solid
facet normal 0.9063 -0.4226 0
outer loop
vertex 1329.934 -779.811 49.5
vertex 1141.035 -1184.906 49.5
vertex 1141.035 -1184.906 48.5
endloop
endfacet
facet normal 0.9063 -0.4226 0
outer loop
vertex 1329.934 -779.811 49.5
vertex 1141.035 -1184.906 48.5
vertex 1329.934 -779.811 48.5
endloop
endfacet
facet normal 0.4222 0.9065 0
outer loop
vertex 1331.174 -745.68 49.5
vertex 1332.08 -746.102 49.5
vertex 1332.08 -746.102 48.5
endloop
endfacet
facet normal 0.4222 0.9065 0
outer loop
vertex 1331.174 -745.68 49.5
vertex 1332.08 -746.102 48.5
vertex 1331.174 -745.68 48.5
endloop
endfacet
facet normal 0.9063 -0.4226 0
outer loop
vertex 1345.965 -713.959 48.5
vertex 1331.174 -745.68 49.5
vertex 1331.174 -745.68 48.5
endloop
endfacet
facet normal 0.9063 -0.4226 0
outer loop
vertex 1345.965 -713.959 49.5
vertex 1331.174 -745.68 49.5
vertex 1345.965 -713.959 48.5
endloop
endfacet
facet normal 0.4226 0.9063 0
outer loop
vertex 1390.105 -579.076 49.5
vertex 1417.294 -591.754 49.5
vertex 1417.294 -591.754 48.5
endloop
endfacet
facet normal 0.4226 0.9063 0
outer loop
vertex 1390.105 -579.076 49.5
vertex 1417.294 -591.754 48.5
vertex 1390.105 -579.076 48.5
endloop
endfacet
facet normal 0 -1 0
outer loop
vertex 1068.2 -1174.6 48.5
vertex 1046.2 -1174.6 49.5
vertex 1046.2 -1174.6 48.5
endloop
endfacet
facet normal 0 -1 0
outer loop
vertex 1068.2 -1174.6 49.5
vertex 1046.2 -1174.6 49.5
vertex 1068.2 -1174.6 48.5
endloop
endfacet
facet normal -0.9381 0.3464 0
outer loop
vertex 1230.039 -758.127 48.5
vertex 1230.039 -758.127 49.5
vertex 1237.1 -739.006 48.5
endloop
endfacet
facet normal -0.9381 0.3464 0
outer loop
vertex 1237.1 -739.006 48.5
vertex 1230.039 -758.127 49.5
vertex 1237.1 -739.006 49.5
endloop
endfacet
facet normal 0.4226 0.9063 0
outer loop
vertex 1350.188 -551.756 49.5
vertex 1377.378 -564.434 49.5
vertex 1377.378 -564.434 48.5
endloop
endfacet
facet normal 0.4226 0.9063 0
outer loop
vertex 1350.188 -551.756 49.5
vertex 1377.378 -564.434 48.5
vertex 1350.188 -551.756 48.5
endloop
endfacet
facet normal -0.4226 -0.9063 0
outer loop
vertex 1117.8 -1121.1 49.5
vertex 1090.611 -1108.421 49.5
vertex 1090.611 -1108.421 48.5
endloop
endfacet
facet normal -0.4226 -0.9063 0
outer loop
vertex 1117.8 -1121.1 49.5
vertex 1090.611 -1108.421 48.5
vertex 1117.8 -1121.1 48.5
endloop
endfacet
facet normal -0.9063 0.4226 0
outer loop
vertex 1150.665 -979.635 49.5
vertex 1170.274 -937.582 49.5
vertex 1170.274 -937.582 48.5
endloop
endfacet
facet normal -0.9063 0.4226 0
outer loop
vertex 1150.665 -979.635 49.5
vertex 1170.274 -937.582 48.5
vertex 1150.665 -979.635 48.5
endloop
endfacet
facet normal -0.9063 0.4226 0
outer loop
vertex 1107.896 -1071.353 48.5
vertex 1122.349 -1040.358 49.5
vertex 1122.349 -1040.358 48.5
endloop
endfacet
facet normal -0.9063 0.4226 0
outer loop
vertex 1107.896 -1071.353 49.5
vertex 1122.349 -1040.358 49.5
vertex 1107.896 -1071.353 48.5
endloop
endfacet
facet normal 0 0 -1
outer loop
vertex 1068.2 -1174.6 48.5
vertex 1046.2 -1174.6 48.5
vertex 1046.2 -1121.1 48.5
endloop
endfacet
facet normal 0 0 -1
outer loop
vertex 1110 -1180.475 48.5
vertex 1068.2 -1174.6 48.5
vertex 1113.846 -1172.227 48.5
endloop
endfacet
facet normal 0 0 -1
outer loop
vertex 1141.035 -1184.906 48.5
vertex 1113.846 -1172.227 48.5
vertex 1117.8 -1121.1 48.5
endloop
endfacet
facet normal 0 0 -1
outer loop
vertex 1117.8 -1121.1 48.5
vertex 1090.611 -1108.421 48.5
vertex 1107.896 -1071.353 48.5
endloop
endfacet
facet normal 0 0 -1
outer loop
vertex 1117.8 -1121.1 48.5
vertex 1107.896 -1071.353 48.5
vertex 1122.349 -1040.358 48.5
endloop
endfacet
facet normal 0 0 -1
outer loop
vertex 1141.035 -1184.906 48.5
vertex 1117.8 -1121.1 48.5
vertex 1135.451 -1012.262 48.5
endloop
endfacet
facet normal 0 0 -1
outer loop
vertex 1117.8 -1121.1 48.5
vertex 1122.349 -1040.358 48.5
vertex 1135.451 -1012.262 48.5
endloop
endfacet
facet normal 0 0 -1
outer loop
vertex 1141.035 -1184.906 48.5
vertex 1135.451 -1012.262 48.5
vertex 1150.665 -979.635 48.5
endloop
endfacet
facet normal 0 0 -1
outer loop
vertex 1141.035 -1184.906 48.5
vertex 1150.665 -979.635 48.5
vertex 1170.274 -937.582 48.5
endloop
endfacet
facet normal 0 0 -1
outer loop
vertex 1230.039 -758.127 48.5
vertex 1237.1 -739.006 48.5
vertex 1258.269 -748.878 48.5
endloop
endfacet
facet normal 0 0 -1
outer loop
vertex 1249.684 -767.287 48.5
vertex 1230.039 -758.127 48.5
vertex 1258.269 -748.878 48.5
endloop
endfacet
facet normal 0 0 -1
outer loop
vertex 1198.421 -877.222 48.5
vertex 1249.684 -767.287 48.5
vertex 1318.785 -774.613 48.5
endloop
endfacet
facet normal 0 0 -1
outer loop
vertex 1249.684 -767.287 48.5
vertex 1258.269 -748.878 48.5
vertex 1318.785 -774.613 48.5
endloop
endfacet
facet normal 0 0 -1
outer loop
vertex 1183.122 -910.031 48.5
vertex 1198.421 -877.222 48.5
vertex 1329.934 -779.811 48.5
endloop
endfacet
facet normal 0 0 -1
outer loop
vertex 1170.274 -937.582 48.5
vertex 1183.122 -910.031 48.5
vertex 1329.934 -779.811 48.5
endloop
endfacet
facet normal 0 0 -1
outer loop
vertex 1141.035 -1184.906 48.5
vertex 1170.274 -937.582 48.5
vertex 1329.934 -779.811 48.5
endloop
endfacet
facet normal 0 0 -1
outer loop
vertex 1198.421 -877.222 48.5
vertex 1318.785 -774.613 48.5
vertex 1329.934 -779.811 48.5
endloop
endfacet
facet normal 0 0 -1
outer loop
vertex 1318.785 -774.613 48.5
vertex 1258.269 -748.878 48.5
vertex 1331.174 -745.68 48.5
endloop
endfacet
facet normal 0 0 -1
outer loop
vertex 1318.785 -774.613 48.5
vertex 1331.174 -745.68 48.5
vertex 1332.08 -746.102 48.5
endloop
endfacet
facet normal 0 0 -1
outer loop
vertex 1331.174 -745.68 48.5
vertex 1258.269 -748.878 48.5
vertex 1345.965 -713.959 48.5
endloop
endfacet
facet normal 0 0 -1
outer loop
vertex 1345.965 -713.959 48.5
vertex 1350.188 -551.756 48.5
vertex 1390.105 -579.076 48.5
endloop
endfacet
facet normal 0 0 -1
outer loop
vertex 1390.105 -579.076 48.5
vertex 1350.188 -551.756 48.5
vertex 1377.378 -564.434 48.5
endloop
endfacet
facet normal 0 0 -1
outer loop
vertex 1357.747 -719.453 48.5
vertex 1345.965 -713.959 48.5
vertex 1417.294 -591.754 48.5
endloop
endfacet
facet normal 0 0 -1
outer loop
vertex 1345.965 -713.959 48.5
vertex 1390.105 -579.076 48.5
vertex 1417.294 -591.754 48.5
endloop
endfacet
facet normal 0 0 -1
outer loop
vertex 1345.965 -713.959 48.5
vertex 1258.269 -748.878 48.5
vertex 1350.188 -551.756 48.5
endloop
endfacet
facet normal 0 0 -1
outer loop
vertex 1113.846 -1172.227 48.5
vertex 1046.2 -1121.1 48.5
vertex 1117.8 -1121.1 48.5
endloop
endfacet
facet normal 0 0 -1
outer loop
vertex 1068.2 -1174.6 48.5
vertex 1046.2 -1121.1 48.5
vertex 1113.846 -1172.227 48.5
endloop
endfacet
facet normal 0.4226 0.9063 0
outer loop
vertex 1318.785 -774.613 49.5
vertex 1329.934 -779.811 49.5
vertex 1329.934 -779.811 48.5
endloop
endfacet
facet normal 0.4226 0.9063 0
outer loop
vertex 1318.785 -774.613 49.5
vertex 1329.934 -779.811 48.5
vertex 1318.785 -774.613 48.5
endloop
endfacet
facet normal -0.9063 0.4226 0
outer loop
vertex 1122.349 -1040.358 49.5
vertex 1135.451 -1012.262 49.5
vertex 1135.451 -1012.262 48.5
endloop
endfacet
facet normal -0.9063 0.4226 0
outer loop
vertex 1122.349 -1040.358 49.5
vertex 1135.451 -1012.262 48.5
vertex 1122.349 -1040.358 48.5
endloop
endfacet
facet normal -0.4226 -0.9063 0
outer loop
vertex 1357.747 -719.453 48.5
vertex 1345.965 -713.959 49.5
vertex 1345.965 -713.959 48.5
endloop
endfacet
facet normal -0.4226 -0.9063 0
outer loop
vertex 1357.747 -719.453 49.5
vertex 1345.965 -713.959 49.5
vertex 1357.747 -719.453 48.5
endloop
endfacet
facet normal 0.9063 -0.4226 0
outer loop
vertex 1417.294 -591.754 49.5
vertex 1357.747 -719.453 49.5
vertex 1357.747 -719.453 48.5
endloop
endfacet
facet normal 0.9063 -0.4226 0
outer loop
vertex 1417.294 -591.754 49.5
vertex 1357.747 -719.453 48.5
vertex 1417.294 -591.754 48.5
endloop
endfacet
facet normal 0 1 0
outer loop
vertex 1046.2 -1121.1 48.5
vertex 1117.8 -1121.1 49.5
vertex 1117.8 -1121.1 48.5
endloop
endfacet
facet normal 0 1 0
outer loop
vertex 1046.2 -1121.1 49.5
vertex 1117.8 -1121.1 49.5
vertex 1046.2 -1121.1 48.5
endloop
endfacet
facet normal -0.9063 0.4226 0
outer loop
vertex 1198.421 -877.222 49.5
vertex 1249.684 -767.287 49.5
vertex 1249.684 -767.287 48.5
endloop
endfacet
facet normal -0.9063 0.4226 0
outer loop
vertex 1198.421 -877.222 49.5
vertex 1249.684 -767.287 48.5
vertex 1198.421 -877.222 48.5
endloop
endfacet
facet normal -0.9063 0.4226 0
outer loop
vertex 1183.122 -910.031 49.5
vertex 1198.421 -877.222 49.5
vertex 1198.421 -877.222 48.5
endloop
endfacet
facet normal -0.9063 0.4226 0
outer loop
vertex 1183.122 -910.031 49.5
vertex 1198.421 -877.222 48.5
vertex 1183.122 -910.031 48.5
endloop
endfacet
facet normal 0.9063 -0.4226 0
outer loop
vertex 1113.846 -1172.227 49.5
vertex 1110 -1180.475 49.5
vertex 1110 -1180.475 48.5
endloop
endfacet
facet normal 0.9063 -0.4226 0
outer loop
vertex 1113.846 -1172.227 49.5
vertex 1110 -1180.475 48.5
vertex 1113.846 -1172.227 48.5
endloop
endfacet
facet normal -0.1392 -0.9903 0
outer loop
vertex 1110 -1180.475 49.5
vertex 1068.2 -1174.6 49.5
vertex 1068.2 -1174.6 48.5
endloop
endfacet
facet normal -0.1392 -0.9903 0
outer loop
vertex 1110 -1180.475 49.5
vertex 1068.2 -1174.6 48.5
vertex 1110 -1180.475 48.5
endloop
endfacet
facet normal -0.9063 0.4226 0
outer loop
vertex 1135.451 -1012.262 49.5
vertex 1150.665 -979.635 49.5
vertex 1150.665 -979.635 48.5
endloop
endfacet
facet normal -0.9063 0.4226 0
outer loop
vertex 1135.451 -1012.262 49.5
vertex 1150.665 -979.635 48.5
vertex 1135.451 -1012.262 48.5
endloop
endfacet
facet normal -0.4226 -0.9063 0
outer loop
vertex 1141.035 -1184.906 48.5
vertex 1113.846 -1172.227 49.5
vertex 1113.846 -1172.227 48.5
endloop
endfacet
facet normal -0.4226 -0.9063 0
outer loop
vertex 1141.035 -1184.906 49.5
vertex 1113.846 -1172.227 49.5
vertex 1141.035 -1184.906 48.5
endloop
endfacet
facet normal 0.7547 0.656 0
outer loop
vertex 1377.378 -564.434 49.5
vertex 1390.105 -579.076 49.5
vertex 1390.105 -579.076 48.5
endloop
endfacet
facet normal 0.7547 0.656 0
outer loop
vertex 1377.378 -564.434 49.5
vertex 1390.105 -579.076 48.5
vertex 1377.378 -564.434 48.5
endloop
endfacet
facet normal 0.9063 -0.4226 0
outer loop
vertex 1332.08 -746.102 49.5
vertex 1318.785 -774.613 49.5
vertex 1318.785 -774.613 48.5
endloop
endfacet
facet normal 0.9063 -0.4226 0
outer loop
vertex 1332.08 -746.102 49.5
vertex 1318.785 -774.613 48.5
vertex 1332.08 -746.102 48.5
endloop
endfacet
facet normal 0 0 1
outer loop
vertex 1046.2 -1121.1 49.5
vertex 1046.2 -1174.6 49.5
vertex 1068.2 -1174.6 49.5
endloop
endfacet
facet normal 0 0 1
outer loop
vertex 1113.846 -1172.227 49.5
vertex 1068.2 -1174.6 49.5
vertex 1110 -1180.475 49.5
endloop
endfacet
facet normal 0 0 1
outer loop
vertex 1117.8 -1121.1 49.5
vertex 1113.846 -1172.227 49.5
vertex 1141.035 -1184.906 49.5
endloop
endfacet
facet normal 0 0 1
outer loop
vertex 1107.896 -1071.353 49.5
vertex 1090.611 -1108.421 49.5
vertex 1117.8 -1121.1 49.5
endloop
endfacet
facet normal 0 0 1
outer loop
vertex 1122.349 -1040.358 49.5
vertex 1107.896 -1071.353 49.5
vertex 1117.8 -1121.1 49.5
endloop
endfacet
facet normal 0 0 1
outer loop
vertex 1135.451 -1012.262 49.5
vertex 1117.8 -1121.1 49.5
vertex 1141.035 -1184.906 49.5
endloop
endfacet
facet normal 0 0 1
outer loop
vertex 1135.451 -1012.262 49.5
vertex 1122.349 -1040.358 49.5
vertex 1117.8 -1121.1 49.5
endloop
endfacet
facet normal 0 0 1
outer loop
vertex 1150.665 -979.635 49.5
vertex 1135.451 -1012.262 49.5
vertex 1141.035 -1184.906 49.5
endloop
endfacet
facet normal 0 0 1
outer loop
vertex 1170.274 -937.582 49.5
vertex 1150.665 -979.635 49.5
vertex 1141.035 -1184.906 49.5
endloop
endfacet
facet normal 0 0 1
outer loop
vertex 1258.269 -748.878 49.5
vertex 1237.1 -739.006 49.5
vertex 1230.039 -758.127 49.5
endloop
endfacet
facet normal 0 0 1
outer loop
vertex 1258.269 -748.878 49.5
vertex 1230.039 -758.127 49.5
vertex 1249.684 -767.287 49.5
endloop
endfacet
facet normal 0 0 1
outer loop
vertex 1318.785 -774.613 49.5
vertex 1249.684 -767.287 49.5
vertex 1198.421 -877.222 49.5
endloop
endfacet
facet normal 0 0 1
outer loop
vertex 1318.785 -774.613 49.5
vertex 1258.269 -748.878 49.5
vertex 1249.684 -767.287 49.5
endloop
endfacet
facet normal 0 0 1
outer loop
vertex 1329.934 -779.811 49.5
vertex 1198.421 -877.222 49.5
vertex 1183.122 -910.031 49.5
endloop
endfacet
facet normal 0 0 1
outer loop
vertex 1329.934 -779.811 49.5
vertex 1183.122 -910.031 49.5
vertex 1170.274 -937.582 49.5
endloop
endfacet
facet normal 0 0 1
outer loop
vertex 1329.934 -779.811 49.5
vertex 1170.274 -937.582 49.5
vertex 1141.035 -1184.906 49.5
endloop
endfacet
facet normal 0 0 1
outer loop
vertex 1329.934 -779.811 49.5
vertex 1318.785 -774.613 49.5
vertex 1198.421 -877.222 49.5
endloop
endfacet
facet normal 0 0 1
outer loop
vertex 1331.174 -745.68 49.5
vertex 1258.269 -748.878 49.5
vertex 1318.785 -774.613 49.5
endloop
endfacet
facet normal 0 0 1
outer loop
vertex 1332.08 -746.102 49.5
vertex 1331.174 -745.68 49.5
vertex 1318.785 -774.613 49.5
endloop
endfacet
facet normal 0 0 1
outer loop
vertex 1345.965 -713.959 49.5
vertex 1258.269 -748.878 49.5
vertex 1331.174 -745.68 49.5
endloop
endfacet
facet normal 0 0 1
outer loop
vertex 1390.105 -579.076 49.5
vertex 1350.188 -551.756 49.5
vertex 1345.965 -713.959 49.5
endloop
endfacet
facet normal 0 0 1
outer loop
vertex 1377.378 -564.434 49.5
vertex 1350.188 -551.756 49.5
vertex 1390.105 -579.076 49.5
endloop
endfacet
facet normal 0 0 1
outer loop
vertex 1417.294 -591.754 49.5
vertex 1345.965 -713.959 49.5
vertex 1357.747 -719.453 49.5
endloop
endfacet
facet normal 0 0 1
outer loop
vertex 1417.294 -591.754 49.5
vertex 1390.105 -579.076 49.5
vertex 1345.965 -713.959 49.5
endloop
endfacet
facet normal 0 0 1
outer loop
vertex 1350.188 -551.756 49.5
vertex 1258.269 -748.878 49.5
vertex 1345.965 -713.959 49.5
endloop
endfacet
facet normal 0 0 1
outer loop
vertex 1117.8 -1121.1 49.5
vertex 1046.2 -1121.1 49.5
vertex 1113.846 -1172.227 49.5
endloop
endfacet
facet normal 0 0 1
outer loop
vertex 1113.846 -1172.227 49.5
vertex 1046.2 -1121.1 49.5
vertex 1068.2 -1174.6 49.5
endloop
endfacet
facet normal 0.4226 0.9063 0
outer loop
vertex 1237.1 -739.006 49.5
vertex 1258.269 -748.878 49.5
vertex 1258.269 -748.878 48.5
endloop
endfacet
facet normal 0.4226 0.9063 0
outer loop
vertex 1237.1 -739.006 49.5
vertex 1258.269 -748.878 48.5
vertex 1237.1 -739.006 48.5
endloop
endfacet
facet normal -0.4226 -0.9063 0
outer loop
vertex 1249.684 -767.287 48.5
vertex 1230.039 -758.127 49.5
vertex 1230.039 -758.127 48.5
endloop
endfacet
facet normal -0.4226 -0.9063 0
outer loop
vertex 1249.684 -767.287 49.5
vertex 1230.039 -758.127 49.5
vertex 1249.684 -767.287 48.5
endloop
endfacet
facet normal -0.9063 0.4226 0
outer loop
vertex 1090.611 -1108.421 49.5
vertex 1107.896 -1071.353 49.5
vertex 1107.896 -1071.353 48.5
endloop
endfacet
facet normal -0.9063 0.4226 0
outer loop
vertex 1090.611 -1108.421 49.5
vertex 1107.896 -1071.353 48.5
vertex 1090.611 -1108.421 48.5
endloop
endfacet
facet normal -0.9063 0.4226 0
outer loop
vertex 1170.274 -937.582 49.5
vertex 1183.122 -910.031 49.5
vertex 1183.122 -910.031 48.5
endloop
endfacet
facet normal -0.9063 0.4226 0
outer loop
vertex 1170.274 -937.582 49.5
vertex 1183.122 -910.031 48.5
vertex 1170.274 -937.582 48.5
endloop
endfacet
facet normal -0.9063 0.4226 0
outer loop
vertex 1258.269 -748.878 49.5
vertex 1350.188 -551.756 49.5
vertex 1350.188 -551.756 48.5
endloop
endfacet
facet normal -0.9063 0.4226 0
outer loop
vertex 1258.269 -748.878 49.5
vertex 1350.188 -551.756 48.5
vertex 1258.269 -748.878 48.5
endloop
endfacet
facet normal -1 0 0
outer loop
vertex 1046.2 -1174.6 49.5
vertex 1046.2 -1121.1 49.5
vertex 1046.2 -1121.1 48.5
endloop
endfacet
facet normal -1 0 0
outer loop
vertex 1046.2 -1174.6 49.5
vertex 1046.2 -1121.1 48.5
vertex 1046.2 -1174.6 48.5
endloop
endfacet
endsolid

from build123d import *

# Parameters (mm, degrees)
EXTRUDE_1_DEPTH = 1
EXTRUDE_2_DEPTH = 2


with BuildPart() as part:
    # 草图1 → 拉伸1 (new body)
    with BuildSketch(Plane.XY.offset(49.5)):
        Polygon((1390.105050596, -579.075609045), (1377.377505434, -564.434243188), (1350.188271823, -551.755695336), (1258.268799894, -748.877639017), (1237.099840045, -739.006390924), (1239.746814184, -733.845622773), (1226.4, -727), (1213.4, -757.7), (1226.746814184, -764.545622773), (1230.039181278, -758.126541077), (1249.684280108, -767.287201107), (1198.420684959, -877.222335675), (1183.121903884, -910.030677565), (1170.274308727, -937.582434291), (1150.664821383, -979.63511561), (1135.45056396, -1012.262195943), (1122.349397846, -1040.357737342), (1107.895853295, -1071.353463658), (1090.610766389, -1108.421452148), (1117.8, -1121.1), (1046.2, -1121.1), (1046.2, -1174.6), (1068.2, -1174.6), (1110, -1180.474606891), (1113.845826182, -1172.227206029), (1141.035059793, -1184.905753881), (1329.933624158, -779.811475326), (1318.78530378, -774.612928158), (1332.080038523, -746.102277496), (1331.173730736, -745.679659234), (1345.965369897, -713.958886688), (1357.747371128, -719.45292409), (1417.294284207, -591.754156897), align=None)
    extrude(amount=-EXTRUDE_1_DEPTH)

    # 草图2 → 拉伸2 (cut)
    with BuildSketch(Plane.XY.offset(49.5)):
        Polygon((1239.746814184, -733.845622773), (1226.4, -727), (1213.4, -757.7), (1226.746814184, -764.545622773), (1230.039181278, -758.126541078), (1237.099840045, -739.006390924), align=None)
    extrude(amount=-EXTRUDE_2_DEPTH, mode=Mode.SUBTRACT)


solid = part.part
